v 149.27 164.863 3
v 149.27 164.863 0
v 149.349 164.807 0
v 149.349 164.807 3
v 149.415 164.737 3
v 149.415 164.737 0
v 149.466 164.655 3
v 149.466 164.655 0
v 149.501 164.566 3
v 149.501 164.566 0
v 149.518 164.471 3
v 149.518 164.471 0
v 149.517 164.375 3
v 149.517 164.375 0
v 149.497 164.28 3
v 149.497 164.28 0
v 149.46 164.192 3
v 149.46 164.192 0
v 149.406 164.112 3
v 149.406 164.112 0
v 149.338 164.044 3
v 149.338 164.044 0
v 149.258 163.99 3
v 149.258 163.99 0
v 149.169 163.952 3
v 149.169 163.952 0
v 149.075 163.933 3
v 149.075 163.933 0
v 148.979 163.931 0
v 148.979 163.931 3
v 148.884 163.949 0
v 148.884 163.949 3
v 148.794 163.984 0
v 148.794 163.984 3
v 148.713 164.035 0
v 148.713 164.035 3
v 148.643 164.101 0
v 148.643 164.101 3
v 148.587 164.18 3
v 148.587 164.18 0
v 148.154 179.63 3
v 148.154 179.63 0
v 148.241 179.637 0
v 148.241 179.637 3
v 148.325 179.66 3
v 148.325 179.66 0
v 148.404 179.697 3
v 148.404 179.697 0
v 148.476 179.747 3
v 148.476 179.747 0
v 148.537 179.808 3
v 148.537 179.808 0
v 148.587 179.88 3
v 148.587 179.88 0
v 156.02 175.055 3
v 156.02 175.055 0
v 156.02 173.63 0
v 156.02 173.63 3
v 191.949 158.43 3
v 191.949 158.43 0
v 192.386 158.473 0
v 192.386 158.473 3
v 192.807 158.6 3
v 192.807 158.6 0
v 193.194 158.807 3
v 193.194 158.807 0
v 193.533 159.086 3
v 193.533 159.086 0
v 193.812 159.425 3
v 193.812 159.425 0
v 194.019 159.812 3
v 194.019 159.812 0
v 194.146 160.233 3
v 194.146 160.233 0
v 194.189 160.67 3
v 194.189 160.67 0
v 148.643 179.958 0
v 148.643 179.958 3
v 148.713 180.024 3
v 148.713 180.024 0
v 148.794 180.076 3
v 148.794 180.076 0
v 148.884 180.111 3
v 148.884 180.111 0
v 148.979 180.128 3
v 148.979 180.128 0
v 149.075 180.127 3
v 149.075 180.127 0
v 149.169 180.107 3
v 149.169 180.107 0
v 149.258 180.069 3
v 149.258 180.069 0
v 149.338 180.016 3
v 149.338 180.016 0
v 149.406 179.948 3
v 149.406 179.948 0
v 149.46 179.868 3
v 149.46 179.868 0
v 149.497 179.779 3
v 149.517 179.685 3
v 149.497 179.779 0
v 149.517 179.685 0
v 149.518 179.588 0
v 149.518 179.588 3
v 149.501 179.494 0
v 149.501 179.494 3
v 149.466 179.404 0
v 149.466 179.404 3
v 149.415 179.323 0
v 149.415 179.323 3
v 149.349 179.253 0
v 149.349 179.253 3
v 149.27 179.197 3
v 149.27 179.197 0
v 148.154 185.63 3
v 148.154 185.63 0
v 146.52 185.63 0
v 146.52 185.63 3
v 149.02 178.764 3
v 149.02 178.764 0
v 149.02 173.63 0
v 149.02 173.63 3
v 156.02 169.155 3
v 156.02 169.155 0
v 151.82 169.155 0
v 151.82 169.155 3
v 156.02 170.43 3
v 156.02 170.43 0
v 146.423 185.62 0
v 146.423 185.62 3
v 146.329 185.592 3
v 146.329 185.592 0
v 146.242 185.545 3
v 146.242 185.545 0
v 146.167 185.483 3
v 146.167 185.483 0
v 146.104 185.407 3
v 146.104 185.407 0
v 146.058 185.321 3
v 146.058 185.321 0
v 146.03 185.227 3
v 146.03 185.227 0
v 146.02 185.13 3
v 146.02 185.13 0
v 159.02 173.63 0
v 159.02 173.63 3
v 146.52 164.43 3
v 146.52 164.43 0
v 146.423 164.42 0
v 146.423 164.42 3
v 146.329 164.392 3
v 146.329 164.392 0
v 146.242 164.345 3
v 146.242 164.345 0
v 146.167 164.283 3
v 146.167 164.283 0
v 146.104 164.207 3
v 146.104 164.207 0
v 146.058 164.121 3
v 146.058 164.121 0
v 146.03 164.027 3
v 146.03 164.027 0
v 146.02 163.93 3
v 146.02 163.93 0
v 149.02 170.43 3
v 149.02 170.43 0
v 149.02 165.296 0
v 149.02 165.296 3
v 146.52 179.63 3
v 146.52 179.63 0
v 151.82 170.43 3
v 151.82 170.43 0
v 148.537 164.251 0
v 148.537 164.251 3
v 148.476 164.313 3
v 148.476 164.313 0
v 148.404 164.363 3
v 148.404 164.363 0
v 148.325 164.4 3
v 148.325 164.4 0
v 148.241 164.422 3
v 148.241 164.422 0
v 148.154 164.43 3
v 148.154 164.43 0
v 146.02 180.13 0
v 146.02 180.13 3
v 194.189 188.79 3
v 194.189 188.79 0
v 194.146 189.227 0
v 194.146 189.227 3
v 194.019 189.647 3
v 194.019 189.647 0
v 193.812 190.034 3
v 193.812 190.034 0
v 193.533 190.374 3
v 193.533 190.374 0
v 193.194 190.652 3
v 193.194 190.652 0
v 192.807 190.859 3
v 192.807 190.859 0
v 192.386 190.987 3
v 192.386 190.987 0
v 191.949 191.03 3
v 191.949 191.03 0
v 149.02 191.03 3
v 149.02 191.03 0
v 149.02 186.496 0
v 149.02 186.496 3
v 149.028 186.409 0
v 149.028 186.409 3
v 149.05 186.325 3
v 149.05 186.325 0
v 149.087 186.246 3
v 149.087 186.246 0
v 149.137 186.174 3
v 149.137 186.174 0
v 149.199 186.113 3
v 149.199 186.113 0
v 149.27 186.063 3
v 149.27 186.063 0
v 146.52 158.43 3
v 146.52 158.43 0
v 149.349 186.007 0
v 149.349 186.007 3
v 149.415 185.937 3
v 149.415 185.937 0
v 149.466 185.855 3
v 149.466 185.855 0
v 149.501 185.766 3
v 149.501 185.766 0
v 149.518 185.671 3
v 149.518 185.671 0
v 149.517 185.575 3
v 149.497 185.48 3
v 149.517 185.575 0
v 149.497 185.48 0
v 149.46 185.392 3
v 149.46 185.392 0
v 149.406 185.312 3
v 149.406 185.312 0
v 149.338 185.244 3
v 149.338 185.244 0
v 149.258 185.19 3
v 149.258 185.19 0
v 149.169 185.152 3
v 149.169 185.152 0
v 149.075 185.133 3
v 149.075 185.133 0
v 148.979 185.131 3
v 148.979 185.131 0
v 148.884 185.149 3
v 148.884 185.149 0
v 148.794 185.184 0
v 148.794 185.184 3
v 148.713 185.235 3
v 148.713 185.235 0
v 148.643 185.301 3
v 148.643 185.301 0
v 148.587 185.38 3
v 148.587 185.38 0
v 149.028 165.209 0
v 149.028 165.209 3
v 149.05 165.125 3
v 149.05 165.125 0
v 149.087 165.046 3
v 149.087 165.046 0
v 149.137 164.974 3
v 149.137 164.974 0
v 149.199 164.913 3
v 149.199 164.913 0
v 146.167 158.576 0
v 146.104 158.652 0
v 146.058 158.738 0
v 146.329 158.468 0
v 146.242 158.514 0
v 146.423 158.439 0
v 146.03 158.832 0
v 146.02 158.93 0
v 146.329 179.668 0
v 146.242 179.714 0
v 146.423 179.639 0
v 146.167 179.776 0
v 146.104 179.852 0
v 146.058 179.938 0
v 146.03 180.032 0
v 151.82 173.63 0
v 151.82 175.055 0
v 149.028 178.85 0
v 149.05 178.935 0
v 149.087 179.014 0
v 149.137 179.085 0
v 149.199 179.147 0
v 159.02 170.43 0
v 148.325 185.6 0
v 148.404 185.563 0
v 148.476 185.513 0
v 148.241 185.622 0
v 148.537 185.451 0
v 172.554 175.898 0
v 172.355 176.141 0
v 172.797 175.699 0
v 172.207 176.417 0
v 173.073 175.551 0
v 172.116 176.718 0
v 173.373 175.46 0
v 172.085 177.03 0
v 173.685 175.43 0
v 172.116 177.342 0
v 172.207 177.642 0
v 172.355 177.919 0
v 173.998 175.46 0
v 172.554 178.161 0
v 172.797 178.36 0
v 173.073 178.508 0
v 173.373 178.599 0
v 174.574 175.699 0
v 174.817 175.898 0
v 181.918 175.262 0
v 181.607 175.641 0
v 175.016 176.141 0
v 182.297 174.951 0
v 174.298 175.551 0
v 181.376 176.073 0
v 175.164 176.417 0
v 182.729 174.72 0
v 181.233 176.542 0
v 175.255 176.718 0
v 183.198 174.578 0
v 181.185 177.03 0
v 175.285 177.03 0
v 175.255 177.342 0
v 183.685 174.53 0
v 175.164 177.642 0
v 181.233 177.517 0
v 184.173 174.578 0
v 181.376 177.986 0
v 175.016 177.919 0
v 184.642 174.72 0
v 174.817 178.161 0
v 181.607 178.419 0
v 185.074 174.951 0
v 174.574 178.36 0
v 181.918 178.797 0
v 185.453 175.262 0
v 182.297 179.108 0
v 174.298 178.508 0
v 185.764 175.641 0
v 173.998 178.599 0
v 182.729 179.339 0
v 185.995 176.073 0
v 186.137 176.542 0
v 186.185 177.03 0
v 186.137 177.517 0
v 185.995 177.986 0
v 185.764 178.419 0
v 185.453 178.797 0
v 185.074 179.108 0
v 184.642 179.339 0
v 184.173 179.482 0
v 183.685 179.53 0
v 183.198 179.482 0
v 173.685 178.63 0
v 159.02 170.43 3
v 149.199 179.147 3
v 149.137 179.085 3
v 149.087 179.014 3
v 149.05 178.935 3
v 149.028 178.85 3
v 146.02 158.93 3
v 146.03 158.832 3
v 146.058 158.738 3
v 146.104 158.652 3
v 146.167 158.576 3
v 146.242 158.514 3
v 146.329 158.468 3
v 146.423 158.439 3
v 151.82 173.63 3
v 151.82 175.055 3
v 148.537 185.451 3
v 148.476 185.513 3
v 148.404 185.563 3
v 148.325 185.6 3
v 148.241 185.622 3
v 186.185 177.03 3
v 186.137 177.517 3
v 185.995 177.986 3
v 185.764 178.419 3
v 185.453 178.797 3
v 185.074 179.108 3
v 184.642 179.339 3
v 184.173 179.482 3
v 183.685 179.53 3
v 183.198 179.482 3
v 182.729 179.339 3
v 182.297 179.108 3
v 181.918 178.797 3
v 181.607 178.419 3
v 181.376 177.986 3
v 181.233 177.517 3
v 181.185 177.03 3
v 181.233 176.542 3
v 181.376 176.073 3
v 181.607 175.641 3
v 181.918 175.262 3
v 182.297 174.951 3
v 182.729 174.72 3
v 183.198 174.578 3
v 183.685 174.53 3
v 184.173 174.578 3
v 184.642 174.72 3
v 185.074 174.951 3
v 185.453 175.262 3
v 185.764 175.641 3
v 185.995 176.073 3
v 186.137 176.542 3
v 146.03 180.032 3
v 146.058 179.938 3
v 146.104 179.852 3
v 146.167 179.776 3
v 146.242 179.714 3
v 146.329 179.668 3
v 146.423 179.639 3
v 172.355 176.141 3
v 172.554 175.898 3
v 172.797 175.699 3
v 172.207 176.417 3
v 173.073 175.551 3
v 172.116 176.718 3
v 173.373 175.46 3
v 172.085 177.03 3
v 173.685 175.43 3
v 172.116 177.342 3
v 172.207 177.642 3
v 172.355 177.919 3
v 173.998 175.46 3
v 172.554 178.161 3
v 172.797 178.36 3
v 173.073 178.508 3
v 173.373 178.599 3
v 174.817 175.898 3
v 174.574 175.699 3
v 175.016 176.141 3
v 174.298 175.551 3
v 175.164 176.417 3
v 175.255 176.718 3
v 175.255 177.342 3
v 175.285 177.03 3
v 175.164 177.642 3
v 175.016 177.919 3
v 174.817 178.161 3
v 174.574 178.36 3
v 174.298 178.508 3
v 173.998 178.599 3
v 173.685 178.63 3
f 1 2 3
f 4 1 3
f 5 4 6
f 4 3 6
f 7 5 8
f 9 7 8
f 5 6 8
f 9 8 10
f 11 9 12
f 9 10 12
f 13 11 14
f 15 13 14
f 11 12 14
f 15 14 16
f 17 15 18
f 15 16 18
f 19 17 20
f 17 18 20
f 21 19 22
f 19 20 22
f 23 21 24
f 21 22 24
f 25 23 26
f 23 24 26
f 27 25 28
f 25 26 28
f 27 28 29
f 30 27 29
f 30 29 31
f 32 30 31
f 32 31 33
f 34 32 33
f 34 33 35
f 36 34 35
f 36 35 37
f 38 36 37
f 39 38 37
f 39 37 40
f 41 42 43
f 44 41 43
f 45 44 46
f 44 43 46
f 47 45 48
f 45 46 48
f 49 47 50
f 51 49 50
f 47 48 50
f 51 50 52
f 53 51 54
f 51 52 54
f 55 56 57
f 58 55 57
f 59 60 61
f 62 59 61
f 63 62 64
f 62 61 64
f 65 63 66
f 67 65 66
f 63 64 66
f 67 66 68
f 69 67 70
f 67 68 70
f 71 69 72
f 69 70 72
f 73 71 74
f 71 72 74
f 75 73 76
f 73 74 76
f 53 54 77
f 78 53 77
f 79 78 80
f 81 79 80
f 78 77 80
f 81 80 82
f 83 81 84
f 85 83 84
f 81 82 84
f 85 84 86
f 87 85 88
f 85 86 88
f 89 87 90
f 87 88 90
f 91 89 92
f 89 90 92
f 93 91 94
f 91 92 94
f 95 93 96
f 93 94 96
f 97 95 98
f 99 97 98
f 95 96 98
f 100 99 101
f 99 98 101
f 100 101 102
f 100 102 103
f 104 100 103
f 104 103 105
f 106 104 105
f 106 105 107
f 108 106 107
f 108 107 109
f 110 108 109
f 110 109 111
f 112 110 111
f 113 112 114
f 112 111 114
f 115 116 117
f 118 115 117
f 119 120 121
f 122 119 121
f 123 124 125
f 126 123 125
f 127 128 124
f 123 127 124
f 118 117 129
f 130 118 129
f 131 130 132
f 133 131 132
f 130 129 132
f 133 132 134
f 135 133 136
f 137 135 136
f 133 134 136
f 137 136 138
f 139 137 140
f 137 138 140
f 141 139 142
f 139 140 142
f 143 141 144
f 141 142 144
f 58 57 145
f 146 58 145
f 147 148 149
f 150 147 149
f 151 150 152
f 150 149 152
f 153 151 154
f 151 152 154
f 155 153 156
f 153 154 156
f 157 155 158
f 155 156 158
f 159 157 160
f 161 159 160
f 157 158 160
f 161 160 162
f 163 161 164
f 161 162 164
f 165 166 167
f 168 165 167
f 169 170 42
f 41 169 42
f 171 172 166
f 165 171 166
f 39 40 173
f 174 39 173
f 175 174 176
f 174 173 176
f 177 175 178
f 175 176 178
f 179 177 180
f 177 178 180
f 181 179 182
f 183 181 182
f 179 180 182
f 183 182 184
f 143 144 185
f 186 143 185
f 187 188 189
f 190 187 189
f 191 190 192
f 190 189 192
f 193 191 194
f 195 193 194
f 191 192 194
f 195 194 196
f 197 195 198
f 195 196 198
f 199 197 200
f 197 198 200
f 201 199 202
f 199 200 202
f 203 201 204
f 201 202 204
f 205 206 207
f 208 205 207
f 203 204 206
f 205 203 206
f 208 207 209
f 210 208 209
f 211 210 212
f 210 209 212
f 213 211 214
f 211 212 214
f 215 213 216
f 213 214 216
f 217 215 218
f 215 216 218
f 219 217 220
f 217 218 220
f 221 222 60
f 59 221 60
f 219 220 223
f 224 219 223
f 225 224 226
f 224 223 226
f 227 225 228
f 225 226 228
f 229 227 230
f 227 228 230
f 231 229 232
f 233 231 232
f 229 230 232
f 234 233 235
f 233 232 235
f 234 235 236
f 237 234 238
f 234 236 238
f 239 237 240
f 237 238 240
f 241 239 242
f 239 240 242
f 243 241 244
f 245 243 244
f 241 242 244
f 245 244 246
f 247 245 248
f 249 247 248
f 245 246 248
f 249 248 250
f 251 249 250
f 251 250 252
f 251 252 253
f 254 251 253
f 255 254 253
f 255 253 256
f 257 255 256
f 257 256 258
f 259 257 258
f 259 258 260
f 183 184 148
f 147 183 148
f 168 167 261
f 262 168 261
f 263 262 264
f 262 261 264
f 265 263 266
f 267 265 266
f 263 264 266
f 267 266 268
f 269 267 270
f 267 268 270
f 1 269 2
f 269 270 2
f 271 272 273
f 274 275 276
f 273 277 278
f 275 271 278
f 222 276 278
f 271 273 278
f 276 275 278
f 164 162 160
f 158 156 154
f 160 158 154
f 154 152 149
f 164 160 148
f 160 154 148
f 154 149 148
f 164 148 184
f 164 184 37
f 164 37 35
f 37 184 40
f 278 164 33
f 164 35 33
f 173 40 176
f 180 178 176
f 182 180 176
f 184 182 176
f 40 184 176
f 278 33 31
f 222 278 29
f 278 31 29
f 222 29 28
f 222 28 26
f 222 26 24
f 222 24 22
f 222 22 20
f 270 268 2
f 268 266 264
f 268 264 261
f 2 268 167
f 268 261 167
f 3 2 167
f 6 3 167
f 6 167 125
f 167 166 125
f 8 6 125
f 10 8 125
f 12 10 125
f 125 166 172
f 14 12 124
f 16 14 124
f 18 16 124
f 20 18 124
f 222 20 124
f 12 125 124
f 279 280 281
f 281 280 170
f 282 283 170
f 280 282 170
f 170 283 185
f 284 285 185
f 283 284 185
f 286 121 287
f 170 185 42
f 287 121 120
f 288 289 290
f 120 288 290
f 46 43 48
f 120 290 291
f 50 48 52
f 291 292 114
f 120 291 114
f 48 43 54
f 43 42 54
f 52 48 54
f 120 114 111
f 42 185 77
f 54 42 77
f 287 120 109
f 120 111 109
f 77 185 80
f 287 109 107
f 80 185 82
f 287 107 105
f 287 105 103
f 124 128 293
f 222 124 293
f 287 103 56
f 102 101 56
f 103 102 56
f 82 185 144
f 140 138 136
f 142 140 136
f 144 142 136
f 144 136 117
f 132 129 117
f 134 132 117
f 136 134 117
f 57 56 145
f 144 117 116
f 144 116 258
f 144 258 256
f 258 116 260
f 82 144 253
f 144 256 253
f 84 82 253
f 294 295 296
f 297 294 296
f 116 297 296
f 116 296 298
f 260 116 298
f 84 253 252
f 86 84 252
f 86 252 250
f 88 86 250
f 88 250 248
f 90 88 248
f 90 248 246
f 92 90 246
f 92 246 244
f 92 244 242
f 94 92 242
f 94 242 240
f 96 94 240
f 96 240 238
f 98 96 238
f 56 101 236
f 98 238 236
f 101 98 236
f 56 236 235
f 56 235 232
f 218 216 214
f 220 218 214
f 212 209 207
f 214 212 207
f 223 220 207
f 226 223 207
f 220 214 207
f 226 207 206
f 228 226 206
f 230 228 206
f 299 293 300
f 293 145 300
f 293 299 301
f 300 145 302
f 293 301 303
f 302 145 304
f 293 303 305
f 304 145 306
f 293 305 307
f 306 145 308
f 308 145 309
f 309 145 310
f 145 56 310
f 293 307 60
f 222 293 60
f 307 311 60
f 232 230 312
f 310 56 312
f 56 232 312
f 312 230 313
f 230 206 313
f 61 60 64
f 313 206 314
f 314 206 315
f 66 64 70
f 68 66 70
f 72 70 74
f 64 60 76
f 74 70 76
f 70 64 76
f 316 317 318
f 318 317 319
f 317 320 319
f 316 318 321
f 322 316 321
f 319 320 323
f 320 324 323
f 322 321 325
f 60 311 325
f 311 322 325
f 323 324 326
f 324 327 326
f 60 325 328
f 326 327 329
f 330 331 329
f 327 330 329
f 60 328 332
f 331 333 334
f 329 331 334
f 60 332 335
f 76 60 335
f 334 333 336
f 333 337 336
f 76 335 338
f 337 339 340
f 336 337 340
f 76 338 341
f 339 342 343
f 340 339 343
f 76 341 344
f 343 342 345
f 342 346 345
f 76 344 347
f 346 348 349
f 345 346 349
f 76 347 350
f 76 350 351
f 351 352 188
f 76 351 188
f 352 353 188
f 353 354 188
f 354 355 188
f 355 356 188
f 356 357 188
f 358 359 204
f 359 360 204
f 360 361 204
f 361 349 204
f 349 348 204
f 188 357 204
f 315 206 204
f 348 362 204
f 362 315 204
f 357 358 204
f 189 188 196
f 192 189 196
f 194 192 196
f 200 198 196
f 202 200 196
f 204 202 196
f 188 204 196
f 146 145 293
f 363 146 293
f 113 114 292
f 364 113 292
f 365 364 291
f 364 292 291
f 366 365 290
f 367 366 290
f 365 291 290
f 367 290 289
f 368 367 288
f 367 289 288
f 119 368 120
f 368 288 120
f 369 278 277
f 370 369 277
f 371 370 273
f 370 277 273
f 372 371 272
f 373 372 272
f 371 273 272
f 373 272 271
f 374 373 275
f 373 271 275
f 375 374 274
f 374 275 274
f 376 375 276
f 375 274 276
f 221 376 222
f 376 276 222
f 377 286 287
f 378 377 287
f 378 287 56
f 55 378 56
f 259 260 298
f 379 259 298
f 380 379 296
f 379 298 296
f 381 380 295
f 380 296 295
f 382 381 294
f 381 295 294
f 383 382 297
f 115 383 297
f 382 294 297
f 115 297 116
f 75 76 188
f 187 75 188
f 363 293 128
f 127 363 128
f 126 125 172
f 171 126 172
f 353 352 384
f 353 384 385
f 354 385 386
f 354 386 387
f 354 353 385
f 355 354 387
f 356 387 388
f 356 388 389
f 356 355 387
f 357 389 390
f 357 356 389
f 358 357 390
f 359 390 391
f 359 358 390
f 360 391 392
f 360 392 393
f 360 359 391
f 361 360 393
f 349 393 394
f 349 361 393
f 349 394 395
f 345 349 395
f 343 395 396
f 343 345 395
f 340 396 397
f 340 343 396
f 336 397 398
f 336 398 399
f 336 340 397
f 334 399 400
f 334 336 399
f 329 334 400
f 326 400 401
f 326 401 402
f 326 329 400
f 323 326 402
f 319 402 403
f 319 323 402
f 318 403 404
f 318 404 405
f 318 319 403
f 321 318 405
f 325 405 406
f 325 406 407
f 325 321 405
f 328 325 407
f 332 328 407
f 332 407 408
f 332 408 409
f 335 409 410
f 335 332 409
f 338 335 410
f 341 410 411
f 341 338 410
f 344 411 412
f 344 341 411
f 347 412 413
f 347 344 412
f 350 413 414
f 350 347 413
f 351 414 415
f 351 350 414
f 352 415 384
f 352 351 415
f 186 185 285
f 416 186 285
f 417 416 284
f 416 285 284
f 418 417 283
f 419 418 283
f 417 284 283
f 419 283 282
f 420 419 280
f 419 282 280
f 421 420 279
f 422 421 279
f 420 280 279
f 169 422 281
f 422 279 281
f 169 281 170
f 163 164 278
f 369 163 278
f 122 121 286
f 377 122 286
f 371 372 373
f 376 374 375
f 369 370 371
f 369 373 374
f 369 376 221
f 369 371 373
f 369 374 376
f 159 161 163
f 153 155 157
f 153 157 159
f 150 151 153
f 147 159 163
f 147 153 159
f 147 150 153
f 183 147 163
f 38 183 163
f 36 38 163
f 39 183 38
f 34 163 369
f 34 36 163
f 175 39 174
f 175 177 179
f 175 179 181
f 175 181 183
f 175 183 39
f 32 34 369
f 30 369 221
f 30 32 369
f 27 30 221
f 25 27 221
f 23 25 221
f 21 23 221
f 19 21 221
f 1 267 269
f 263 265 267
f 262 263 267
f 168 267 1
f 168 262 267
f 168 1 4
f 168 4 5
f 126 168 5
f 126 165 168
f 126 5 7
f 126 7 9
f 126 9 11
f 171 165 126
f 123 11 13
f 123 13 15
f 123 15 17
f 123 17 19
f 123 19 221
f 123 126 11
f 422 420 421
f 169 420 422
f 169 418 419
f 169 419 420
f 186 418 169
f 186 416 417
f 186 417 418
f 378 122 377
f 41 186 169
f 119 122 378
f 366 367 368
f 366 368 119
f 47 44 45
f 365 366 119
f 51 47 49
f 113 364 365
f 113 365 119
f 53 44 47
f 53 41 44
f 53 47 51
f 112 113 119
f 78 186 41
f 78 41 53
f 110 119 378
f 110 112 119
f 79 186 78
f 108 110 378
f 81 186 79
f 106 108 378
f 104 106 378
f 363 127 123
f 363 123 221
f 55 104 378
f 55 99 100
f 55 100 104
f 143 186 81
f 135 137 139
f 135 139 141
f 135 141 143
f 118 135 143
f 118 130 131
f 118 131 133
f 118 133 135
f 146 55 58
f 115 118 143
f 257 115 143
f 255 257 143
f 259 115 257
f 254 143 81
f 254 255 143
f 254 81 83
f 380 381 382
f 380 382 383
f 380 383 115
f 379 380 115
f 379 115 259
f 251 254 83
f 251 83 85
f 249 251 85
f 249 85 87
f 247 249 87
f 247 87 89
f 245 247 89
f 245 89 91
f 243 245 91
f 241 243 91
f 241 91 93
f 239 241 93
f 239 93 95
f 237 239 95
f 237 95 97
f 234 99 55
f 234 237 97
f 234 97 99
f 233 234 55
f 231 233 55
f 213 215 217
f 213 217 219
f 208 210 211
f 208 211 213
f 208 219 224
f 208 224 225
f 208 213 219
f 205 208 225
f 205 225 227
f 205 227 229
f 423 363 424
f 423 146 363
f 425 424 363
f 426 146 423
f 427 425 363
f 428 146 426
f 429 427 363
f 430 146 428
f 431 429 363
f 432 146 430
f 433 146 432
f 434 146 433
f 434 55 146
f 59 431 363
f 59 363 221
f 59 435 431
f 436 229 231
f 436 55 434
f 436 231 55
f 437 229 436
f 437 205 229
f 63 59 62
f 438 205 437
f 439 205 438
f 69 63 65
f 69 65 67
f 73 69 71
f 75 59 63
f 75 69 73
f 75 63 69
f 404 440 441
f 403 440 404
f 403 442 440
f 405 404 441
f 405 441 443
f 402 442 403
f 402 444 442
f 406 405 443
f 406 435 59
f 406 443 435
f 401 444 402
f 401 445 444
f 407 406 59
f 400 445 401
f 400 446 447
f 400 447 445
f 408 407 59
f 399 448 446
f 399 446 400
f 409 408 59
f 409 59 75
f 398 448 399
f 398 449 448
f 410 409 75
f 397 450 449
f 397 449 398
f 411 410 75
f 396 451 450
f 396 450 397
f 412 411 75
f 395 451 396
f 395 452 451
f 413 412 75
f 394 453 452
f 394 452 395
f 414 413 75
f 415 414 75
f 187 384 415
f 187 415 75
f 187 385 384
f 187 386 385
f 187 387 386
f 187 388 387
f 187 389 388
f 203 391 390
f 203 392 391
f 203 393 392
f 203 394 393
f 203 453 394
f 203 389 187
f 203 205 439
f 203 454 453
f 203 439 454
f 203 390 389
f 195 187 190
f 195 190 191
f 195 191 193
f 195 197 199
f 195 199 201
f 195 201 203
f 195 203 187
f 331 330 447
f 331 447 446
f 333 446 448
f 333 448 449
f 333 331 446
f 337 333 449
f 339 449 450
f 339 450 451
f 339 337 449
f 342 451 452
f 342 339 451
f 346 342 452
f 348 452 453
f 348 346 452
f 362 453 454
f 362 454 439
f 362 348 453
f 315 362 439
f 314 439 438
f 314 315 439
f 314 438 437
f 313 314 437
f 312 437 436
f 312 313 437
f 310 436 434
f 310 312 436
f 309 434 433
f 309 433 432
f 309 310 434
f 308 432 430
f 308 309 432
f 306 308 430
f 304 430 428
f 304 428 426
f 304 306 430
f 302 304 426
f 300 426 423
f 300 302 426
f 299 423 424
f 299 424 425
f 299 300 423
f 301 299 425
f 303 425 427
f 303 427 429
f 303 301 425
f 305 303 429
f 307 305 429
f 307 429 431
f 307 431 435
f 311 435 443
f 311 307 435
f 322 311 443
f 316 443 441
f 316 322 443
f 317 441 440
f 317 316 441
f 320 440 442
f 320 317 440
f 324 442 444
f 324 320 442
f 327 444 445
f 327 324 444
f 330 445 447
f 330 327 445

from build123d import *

# Parameters (mm, degrees)
MODEL_R             = 1.6
MODEL_R_2           = 2.5
BOSS_EXTRUDE1_DEPTH = 3


with BuildPart() as part:
    # Model → Boss-Extrude1 (new body)
    with BuildSketch(Plane.XY):
        with BuildLine():
            Line((146.020094854, 163.929669503), (146.020094854, 158.929672503))
            ThreePointArc((146.020094854, 158.929672503), (146.166539616, 158.576119306), (146.520091281, 158.429670848))
            Line((146.520091281, 158.429670848), (191.949370202, 158.429670848))
            ThreePointArc((191.949370202, 158.429670848), (193.533289392, 159.085751658), (194.189370202, 160.669670848))
            Line((194.189370202, 160.669670848), (194.189370202, 188.789666848))
            ThreePointArc((194.189370202, 188.789666848), (193.533289392, 190.373586038), (191.949370202, 191.029666848))
            Line((191.949370202, 191.029666848), (149.020161786, 191.029666848))
            Line((149.020161786, 191.029666848), (149.020161786, 186.495697517))
            ThreePointArc((149.020161786, 186.495697517), (149.087148935, 186.245697179), (149.270161786, 186.062684219))
            ThreePointArc((149.270161786, 186.062684219), (149.373716972, 185.276118333), (148.587150624, 185.379670014))
            ThreePointArc((148.587150624, 185.379670014), (148.404138038, 185.562681651), (148.154138786, 185.629668517))
            Line((148.154138786, 185.629668517), (146.520109786, 185.629668517))
            ThreePointArc((146.520109786, 185.629668517), (146.166556395, 185.483221908), (146.020109786, 185.129668517))
            Line((146.020109786, 185.129668517), (146.020109786, 180.129671517))
            ThreePointArc((146.020109786, 180.129671517), (146.166554627, 179.776114895), (146.520109786, 179.629666517))
            Line((146.520109786, 179.629666517), (148.154138786, 179.629666517))
            ThreePointArc((148.154138786, 179.629666517), (148.404140189, 179.696653822), (148.587154607, 179.879666726))
            ThreePointArc((148.587154607, 179.879666726), (149.373734927, 179.983242082), (149.270155207, 179.196662336))
            ThreePointArc((149.270155207, 179.196662336), (149.087143628, 179.013649891), (149.02015667, 178.76365081))
            Line((149.02015667, 178.76365081), (149.02015667, 173.629671744))
            Line((149.02015667, 173.629671744), (151.82015667, 173.629671744))
            Line((151.82015667, 173.629671744), (151.82015667, 175.054680432))
            Line((151.82015667, 175.054680432), (156.020152766, 175.054680432))
            Line((156.020152766, 175.054680432), (156.020152766, 173.629670513))
            Line((156.020152766, 173.629670513), (159.020147427, 173.629670513))
            Line((159.020147427, 173.629670513), (159.020147427, 170.429672075))
            Line((159.020147427, 170.429672075), (156.020147427, 170.429672075))
            Line((156.020147427, 170.429672075), (156.020147427, 169.154680763))
            Line((156.020147427, 169.154680763), (151.820147427, 169.154680763))
            Line((151.820147427, 169.154680763), (151.820147427, 170.429672075))
            Line((151.820147427, 170.429672075), (149.020147427, 170.429672075))
            Line((149.020147427, 170.429672075), (149.020147427, 165.295696252))
            ThreePointArc((149.020147427, 165.295696252), (149.08713456, 165.045696208), (149.270147141, 164.862683385))
            ThreePointArc((149.270147141, 164.862683385), (149.373701806, 164.07611743), (148.587135527, 164.179669631))
            ThreePointArc((148.587135527, 164.179669631), (148.404130845, 164.362680921), (148.154138455, 164.429670848))
            Line((148.154138455, 164.429670848), (146.520087311, 164.429670848))
            ThreePointArc((146.520087311, 164.429670848), (146.166538715, 164.283220702), (146.020094854, 163.929669503))
        make_face()
        with Locations((173.68542699, 177.029665772)):
            Circle(MODEL_R, mode=Mode.SUBTRACT)
        with Locations((183.68542699, 177.029665772)):
            Circle(MODEL_R_2, mode=Mode.SUBTRACT)
    extrude(amount=BOSS_EXTRUDE1_DEPTH)


solid = part.part
